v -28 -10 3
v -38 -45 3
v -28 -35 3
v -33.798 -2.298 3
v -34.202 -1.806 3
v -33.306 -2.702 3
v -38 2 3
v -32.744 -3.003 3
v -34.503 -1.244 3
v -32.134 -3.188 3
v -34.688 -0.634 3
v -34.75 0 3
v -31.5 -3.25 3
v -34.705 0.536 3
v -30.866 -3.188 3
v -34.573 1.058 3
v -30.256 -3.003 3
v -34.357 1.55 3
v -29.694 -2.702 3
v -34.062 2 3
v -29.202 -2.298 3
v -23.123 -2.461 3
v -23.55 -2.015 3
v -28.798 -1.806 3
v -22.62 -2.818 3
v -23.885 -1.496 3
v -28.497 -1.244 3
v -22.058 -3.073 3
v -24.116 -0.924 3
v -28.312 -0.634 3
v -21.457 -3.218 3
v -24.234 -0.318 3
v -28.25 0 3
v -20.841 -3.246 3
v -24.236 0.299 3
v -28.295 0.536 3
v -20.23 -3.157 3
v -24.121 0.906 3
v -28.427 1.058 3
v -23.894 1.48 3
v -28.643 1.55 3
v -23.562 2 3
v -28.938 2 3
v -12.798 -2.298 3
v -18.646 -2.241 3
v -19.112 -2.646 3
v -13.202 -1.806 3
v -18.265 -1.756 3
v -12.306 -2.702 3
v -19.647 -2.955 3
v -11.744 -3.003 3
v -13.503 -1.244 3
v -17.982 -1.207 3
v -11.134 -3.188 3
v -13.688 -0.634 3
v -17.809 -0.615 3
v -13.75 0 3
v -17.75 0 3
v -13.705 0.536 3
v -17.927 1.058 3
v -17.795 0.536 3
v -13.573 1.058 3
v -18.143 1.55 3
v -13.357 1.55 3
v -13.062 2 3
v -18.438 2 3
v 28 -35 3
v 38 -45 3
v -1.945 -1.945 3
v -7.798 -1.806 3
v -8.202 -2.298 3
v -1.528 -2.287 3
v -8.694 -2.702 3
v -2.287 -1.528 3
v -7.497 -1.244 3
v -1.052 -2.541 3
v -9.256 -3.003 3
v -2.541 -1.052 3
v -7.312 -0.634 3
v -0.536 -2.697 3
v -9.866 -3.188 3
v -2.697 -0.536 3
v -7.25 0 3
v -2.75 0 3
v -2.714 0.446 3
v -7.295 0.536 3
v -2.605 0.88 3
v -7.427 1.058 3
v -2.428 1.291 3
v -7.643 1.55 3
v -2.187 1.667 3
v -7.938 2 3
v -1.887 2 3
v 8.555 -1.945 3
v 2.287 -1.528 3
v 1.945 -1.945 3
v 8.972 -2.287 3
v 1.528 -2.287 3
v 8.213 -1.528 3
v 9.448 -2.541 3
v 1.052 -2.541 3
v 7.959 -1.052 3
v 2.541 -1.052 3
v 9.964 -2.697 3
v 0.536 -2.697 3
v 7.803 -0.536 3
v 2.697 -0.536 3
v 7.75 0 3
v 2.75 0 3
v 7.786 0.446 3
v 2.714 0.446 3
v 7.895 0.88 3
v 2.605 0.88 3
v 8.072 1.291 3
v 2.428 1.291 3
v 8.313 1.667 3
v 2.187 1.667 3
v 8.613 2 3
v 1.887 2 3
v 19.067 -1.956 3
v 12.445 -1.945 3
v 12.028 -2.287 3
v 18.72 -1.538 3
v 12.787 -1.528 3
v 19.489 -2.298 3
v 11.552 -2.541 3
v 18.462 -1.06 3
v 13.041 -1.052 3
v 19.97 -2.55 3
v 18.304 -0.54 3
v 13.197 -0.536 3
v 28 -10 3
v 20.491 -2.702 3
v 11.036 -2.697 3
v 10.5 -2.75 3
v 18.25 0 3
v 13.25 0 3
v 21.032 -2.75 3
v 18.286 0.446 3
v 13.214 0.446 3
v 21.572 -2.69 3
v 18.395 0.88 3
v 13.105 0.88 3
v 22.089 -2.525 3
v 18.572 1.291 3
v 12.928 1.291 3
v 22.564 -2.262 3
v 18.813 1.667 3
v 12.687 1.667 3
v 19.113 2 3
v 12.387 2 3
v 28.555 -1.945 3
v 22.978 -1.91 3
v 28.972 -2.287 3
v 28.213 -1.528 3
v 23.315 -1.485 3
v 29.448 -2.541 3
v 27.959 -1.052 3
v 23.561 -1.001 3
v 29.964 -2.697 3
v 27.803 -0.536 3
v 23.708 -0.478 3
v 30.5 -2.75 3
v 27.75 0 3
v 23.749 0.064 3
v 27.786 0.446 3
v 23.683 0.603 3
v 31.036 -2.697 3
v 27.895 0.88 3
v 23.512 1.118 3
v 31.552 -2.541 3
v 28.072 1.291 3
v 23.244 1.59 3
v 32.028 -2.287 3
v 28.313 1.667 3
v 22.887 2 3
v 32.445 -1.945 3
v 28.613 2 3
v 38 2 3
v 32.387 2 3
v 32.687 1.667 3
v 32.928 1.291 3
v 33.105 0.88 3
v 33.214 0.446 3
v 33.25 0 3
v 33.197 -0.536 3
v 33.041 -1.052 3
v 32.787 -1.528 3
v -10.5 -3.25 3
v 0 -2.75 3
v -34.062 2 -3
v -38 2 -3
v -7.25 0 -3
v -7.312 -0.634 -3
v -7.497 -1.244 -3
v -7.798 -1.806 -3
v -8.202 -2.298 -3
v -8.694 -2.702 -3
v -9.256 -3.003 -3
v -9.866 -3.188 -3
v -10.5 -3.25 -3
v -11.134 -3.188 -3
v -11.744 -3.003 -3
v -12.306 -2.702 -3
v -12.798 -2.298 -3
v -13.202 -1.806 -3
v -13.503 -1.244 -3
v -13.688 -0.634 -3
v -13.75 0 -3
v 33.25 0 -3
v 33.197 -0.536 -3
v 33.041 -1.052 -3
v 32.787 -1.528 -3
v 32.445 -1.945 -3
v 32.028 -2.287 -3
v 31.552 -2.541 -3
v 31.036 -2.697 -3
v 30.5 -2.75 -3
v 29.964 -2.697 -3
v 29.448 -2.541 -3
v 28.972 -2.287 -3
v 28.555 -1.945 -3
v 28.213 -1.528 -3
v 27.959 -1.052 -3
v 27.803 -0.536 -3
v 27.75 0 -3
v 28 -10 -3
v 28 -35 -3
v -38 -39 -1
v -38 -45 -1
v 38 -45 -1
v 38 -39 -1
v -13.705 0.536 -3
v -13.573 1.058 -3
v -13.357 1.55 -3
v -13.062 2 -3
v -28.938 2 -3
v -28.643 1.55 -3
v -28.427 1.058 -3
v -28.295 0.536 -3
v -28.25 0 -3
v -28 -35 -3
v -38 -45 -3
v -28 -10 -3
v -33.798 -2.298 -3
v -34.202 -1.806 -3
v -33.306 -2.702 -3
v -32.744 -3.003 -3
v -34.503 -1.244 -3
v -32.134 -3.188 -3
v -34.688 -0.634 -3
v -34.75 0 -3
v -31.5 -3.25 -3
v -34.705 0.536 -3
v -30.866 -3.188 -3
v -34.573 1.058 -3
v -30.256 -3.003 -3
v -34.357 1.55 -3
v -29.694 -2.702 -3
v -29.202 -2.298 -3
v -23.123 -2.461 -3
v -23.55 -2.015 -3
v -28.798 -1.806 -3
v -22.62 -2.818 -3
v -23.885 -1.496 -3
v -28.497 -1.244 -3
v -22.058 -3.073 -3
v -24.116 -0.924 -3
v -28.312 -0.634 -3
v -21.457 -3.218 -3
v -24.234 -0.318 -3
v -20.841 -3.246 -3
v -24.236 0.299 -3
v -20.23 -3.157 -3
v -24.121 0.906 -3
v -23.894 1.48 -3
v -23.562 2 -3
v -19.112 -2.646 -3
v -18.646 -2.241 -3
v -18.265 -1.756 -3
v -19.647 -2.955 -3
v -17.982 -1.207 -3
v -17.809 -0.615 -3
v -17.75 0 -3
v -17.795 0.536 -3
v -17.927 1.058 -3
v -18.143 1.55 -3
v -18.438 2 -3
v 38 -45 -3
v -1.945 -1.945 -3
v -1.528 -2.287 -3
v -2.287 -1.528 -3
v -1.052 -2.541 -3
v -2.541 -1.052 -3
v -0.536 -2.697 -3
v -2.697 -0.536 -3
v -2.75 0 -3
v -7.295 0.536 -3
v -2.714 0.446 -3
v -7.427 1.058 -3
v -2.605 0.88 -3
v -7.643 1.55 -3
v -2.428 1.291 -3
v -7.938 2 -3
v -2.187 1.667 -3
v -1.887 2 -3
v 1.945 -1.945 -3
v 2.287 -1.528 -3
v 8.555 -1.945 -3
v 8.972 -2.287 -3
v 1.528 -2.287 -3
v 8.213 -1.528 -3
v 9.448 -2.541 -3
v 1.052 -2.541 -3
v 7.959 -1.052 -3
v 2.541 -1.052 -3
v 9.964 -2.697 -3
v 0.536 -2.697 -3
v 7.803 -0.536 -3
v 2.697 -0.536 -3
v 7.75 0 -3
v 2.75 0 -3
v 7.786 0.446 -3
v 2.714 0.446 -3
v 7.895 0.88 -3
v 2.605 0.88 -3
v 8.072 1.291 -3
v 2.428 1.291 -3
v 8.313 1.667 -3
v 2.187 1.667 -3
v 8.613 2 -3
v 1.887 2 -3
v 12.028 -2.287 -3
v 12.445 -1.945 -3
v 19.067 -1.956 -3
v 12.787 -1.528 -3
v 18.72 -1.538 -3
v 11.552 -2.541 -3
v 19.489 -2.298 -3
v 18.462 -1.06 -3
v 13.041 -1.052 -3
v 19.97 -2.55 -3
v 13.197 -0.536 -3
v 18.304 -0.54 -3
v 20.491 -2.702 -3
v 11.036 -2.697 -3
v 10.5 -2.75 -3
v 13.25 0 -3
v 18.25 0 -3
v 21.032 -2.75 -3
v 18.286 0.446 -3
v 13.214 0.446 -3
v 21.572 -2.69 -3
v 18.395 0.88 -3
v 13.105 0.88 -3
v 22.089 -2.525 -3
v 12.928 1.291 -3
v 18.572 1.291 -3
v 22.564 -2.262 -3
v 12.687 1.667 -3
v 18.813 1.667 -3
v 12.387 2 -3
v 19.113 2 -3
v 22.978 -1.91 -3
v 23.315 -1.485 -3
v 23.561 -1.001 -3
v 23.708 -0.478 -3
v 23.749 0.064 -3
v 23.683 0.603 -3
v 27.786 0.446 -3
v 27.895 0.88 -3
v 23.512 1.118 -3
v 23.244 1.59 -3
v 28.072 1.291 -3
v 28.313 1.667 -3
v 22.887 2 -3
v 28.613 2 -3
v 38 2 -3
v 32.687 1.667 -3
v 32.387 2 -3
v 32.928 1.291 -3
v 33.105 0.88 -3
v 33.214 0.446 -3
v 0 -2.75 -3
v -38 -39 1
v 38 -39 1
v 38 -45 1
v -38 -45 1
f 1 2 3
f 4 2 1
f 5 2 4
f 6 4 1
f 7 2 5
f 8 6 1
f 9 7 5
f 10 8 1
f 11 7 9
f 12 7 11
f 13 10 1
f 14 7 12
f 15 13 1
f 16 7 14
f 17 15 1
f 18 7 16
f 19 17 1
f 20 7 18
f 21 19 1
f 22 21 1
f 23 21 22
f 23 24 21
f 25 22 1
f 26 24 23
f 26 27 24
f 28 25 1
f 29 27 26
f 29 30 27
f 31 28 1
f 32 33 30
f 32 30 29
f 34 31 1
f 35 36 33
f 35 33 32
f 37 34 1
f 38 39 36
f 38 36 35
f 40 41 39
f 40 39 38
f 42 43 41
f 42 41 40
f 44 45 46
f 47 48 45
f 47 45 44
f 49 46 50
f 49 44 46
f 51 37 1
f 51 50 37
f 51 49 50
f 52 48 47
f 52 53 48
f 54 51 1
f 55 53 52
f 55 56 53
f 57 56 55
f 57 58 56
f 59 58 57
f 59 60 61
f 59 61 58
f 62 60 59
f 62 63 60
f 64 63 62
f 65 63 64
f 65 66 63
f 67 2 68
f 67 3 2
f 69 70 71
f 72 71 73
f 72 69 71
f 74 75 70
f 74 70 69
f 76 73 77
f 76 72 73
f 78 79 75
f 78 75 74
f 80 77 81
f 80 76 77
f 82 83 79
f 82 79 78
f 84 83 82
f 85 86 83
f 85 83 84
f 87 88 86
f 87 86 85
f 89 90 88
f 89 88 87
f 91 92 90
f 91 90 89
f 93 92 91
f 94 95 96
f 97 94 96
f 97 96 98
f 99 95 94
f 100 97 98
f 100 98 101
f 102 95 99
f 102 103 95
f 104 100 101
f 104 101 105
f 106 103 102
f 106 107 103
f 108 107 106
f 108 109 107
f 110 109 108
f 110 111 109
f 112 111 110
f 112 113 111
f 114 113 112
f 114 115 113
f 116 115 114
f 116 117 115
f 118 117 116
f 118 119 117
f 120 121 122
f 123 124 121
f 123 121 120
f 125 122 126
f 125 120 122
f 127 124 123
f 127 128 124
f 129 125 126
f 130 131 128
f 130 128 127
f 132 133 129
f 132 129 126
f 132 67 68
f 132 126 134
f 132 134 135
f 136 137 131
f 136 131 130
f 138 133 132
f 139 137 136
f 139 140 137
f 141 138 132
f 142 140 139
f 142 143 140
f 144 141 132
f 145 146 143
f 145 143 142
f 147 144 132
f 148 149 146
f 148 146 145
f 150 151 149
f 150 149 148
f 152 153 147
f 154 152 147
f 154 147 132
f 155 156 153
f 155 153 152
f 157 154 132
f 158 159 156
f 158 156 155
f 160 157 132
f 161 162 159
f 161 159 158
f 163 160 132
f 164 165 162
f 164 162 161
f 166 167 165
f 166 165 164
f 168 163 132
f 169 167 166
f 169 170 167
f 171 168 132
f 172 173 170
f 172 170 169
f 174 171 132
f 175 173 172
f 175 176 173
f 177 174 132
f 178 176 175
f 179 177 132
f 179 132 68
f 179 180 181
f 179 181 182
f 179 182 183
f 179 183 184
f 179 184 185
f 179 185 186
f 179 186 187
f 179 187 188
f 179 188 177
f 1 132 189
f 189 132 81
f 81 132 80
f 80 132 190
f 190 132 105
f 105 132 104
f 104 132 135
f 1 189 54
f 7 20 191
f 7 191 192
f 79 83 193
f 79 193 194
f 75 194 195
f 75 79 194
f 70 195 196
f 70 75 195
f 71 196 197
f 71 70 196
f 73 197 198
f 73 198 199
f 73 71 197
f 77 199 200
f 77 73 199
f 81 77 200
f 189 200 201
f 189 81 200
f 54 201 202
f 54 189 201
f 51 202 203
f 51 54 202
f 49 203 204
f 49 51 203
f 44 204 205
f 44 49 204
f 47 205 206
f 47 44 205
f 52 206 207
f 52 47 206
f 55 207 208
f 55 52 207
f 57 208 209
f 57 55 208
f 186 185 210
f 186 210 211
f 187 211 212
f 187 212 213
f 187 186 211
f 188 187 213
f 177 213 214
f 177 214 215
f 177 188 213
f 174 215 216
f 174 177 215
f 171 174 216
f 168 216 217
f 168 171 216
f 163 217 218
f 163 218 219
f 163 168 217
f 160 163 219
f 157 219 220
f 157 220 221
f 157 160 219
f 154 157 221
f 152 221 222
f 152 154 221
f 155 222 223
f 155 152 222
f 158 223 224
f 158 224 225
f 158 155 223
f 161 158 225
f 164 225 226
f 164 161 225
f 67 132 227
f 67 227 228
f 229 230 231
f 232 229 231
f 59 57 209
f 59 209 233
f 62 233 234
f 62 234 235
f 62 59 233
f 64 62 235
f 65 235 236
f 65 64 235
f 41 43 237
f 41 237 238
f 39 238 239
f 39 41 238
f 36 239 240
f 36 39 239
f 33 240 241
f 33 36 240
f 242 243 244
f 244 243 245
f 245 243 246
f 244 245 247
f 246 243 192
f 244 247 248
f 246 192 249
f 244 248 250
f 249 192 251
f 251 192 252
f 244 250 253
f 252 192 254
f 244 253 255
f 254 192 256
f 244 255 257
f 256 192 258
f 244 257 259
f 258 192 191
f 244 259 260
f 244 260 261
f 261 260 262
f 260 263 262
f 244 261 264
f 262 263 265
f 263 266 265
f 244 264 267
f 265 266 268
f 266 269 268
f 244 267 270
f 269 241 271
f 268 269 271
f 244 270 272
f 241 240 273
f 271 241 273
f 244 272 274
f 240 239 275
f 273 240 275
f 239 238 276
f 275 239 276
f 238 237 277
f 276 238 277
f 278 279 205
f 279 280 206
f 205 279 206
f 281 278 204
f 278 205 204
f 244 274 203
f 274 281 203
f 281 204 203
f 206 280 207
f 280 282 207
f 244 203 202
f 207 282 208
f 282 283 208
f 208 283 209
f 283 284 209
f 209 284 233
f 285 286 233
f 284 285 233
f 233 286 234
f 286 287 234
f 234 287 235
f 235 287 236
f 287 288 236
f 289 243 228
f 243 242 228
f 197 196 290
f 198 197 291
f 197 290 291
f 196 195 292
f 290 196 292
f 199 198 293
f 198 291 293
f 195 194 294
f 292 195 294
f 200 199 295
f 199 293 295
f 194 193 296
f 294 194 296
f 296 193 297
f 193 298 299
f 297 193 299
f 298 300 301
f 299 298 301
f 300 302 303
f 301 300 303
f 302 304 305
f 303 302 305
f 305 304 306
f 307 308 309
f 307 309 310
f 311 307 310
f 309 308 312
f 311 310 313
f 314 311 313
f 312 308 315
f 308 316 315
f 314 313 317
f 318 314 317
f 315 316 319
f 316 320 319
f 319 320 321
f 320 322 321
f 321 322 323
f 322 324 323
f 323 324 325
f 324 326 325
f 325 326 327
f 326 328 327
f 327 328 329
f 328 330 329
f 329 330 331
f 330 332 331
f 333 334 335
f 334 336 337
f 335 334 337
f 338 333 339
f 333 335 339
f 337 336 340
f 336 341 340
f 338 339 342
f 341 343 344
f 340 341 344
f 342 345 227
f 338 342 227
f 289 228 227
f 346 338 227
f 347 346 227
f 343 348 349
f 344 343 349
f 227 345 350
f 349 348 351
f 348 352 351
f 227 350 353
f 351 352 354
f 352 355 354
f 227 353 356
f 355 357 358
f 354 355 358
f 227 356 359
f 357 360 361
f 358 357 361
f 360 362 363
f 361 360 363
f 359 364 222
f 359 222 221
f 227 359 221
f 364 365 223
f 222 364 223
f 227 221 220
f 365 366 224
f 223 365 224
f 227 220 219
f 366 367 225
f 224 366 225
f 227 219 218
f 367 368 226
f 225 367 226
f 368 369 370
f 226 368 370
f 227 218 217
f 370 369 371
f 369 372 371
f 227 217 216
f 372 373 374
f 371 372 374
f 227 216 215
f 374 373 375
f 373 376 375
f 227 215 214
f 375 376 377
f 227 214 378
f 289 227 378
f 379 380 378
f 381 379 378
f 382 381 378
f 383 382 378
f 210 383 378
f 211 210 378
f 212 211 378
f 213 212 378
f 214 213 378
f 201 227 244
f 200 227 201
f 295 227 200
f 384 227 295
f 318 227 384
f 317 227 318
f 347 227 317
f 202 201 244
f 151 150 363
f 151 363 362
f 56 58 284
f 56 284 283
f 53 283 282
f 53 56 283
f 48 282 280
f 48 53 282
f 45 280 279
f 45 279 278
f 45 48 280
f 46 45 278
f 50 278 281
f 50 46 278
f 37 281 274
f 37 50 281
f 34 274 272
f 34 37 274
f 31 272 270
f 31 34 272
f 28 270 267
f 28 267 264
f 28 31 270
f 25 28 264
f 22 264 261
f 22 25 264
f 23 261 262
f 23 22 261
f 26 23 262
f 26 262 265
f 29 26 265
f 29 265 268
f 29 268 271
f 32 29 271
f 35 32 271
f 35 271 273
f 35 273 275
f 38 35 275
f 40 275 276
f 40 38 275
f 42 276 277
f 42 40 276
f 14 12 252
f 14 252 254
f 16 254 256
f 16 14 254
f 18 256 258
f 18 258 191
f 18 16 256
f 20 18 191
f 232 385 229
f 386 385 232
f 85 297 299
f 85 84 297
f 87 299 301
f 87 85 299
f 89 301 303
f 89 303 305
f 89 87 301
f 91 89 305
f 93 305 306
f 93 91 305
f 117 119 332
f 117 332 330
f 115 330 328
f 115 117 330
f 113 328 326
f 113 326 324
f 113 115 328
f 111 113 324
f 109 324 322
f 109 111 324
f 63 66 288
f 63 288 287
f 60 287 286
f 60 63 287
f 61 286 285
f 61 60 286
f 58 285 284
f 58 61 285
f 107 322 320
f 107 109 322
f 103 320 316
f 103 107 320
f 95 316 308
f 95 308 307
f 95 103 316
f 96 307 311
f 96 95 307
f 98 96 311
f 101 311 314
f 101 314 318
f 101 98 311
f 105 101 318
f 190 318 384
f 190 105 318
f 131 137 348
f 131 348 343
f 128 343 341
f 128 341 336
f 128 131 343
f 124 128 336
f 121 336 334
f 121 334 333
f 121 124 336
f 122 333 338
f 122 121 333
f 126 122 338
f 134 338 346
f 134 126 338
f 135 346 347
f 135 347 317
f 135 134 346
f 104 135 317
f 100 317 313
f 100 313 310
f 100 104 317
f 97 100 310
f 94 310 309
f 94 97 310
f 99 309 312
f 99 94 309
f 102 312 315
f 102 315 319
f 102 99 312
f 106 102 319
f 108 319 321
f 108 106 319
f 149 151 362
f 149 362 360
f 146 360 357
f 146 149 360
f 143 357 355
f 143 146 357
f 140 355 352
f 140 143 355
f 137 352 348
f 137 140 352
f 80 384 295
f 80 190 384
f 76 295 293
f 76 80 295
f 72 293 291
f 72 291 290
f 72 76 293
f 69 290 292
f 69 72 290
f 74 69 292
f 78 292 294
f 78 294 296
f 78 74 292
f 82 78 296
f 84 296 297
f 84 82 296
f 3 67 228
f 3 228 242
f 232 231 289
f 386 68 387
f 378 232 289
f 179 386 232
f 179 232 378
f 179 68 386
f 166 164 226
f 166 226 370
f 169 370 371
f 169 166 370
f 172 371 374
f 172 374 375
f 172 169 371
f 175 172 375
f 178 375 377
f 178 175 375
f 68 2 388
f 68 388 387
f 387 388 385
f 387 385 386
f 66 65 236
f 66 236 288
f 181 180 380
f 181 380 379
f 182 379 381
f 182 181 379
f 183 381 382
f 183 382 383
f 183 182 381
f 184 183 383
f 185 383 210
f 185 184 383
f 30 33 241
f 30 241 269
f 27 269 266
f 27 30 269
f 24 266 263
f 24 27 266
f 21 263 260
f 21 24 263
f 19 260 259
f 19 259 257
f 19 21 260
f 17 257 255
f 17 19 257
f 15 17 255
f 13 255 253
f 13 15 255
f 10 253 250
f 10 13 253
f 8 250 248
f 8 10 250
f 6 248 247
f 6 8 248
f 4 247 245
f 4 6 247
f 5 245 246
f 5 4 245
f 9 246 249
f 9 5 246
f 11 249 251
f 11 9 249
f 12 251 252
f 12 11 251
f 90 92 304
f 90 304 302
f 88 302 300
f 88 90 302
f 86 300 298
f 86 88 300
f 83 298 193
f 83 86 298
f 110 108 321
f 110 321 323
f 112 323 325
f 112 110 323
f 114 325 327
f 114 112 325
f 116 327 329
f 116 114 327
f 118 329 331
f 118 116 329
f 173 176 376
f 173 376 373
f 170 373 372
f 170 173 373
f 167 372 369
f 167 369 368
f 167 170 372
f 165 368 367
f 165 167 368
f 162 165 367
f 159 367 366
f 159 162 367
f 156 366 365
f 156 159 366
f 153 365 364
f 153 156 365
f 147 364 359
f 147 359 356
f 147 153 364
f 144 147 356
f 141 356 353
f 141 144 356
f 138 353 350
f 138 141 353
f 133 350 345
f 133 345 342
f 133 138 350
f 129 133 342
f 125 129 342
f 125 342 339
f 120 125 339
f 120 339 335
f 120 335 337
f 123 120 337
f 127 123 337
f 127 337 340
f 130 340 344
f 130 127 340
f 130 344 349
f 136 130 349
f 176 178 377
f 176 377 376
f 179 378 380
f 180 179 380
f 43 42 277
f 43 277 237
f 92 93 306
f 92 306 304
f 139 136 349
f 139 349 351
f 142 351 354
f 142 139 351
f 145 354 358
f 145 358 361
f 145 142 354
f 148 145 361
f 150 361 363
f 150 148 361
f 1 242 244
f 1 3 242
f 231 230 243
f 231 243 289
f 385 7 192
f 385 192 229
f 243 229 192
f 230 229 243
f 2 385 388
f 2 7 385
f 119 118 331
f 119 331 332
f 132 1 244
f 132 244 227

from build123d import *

# Parameters (mm, degrees)
F1_DEPTH      = 3
F1_DEPTH_BACK = 3
F2_W          = 105.405718
F2_H          = 2
F3_DEPTH      = 6


with BuildPart() as f1:
    # F0 (on Top) → F1 (new body, two sides)
    with BuildSketch(Plane.XY) as f1_sk:
        with BuildLine():
            ThreePointArc((-2.75, 0), (-2.525174, 1.089034), (-1.887459, 2))
            Line((-1.887459, 2), (-3.172144, 2))
            ThreePointArc((-3.172144, 2), (-3.602641, 1.040903), (-3.75, 0))
            Line((-3.75, 0), (-2.75, 0))
        make_face()
        with BuildLine():
            ThreePointArc((0, -2.75), (-1.944544, -1.944544), (-2.75, 0))
            Line((-2.75, 0), (-3.75, 0))
            ThreePointArc((-3.75, 0), (-2.65165, -2.65165), (0, -3.75))
            Line((0, -3.75), (0, -2.75))
        make_face()
        with BuildLine():
            ThreePointArc((-3.75, 0), (-3.602641, 1.040903), (-3.172144, 2))
            Line((-3.172144, 2), (-6.75, 2))
            ThreePointArc((-6.75, 2), (-6.376894, 1.030776), (-6.25, 0))
            Line((-6.25, 0), (-3.75, 0))
        make_face()
        with BuildLine():
            ThreePointArc((2.75, 0), (1.944544, -1.944544), (0, -2.75))
            Line((0, -2.75), (0, -3.75))
            ThreePointArc((0, -3.75), (2.65165, -2.65165), (3.75, 0))
            Line((3.75, 0), (2.75, 0))
        make_face()
        with BuildLine():
            ThreePointArc((0, -3.75), (-2.65165, -2.65165), (-3.75, 0))
            Line((-3.75, 0), (-6.25, 0))
            Line((-6.25, 0), (-7.25, 0))
            ThreePointArc((-7.25, 0), (-10.5, -3.25), (-13.75, 0))
            Line((-13.75, 0), (-14.75, 0))
            Line((-14.75, 0), (-16.75, 0))
            Line((-16.75, 0), (-17.25, 0))
            Line((-17.25, 0), (-17.75, 0))
            ThreePointArc((-17.75, 0), (-22.057557, -3.073121), (-23.561738, 2))
            Line((-23.561738, 2), (-24.172144, 2))
            Line((-24.172144, 2), (-24.75, 2))
            ThreePointArc((-24.75, 2), (-25.123106, 1.030776), (-25.25, 0))
            Line((-25.25, 0), (-27.75, 0))
            Line((-27.75, 0), (-28.25, 0))
            ThreePointArc((-28.25, 0), (-31.5, -3.25), (-34.75, 0))
            Line((-34.75, 0), (-38, 0))
            Line((-38, 0), (-38, -45))
            Line((-38, -45), (0, -45))
            Line((0, -45), (0, -35))
            Line((0, -35), (-28, -35))
            Line((-28, -35), (-28, -10))
            Line((-28, -10), (0, -10))
            Line((0, -10), (0, -3.75))
        make_face()
        with BuildLine():
            ThreePointArc((-6.25, 0), (-6.376894, 1.030776), (-6.75, 2))
            Line((-6.75, 2), (-7.327856, 2))
            Line((-7.327856, 2), (-7.938262, 2))
            ThreePointArc((-7.938262, 2), (-7.426879, 1.057557), (-7.25, 0))
            Line((-7.25, 0), (-6.25, 0))
        make_face()
        with BuildLine():
            ThreePointArc((1.887459, 2), (2.525174, 1.089034), (2.75, 0))
            Line((2.75, 0), (3.75, 0))
            ThreePointArc((3.75, 0), (3.602641, 1.040903), (3.172144, 2))
            Line((3.172144, 2), (1.887459, 2))
        make_face()
        with BuildLine():
            ThreePointArc((3.75, 0), (2.65165, -2.65165), (0, -3.75))
            Line((0, -3.75), (0, -10))
            Line((0, -10), (28, -10))
            Line((28, -10), (28, -35))
            Line((28, -35), (0, -35))
            Line((0, -35), (0, -45))
            Line((0, -45), (38, -45))
            Line((38, -45), (38, 0))
            Line((38, 0), (34.25, 0))
            Line((34.25, 0), (33.25, 0))
            ThreePointArc((33.25, 0), (30.5, -2.75), (27.75, 0))
            Line((27.75, 0), (26.75, 0))
            ThreePointArc((26.75, 0), (26.897359, 1.040903), (27.327856, 2))
            Line((27.327856, 2), (24.172144, 2))
            Line((24.172144, 2), (22.887459, 2))
            ThreePointArc((22.887459, 2), (22.089034, -2.525174), (18.25, 0))
            Line((18.25, 0), (17.25, 0))
            Line((17.25, 0), (14.25, 0))
            Line((14.25, 0), (13.25, 0))
            ThreePointArc((13.25, 0), (10.5, -2.75), (7.75, 0))
            Line((7.75, 0), (6.75, 0))
            Line((6.75, 0), (3.75, 0))
        make_face()
        with BuildLine():
            ThreePointArc((3.172144, 2), (3.602641, 1.040903), (3.75, 0))
            Line((3.75, 0), (6.75, 0))
            ThreePointArc((6.75, 0), (6.897359, 1.040903), (7.327856, 2))
            Line((7.327856, 2), (3.172144, 2))
        make_face()
        with BuildLine():
            ThreePointArc((7.327856, 2), (6.897359, 1.040903), (6.75, 0))
            Line((6.75, 0), (7.75, 0))
            ThreePointArc((7.75, 0), (7.974826, 1.089034), (8.612541, 2))
            Line((8.612541, 2), (7.327856, 2))
        make_face()
        with BuildLine():
            Line((-14.75, 0), (-13.75, 0))
            ThreePointArc((-13.75, 0), (-13.573121, 1.057557), (-13.061738, 2))
            Line((-13.061738, 2), (-13.672144, 2))
            Line((-13.672144, 2), (-14.25, 2))
            ThreePointArc((-14.25, 2), (-14.623106, 1.030776), (-14.75, 0))
        make_face()
        with BuildLine():
            Line((-16.75, 0), (-14.75, 0))
            ThreePointArc((-14.75, 0), (-14.623106, 1.030776), (-14.25, 2))
            Line((-14.25, 2), (-17.25, 2))
            ThreePointArc((-17.25, 2), (-16.876894, 1.030776), (-16.75, 0))
        make_face()
        with BuildLine():
            ThreePointArc((12.387459, 2), (13.025174, 1.089034), (13.25, 0))
            Line((13.25, 0), (14.25, 0))
            ThreePointArc((14.25, 0), (14.102641, 1.040903), (13.672144, 2))
            Line((13.672144, 2), (12.387459, 2))
        make_face()
        with BuildLine():
            Line((-17.25, 0), (-16.75, 0))
            ThreePointArc((-16.75, 0), (-16.876894, 1.030776), (-17.25, 2))
            Line((-17.25, 2), (-17.827856, 2))
            Line((-17.827856, 2), (-18.438262, 2))
            ThreePointArc((-18.438262, 2), (-17.926879, 1.057557), (-17.75, 0))
            Line((-17.75, 0), (-17.25, 0))
        make_face()
        with BuildLine():
            ThreePointArc((13.672144, 2), (14.102641, 1.040903), (14.25, 0))
            Line((14.25, 0), (17.25, 0))
            ThreePointArc((17.25, 0), (17.397359, 1.040903), (17.827856, 2))
            Line((17.827856, 2), (13.672144, 2))
        make_face()
        with BuildLine():
            Line((-38, 2), (-38, 0))
            Line((-38, 0), (-34.75, 0))
            ThreePointArc((-34.75, 0), (-34.573121, 1.057557), (-34.061738, 2))
            Line((-34.061738, 2), (-38, 2))
        make_face()
        with BuildLine():
            Line((34.25, 0), (38, 0))
            Line((38, 0), (38, 2))
            Line((38, 2), (33.672144, 2))
            ThreePointArc((33.672144, 2), (34.102641, 1.040903), (34.25, 0))
        make_face()
        with BuildLine():
            ThreePointArc((17.827856, 2), (17.397359, 1.040903), (17.25, 0))
            Line((17.25, 0), (18.25, 0))
            ThreePointArc((18.25, 0), (18.474826, 1.089034), (19.112541, 2))
            Line((19.112541, 2), (17.827856, 2))
        make_face()
        with BuildLine():
            Line((33.25, 0), (34.25, 0))
            ThreePointArc((34.25, 0), (34.102641, 1.040903), (33.672144, 2))
            Line((33.672144, 2), (32.387459, 2))
            ThreePointArc((32.387459, 2), (33.025174, 1.089034), (33.25, 0))
        make_face()
        with BuildLine():
            ThreePointArc((-28.938262, 2), (-28.426879, 1.057557), (-28.25, 0))
            Line((-28.25, 0), (-27.75, 0))
            Line((-27.75, 0), (-25.25, 0))
            ThreePointArc((-25.25, 0), (-25.123106, 1.030776), (-24.75, 2))
            Line((-24.75, 2), (-27.327856, 2))
            Line((-27.327856, 2), (-28.612541, 2))
            Line((-28.612541, 2), (-28.938262, 2))
        make_face()
        with BuildLine():
            Line((26.75, 0), (27.75, 0))
            ThreePointArc((27.75, 0), (27.974826, 1.089034), (28.612541, 2))
            Line((28.612541, 2), (27.327856, 2))
            ThreePointArc((27.327856, 2), (26.897359, 1.040903), (26.75, 0))
        make_face()
    extrude(amount=F1_DEPTH)
    extrude(f1_sk.sketch, amount=-F1_DEPTH_BACK)

    # F2 (on face) → F3 (cut)
    with BuildSketch(Plane.XZ.offset(45)):
        Rectangle(F2_W, F2_H)
    extrude(amount=-F3_DEPTH, mode=Mode.SUBTRACT)


solid = f1.part
